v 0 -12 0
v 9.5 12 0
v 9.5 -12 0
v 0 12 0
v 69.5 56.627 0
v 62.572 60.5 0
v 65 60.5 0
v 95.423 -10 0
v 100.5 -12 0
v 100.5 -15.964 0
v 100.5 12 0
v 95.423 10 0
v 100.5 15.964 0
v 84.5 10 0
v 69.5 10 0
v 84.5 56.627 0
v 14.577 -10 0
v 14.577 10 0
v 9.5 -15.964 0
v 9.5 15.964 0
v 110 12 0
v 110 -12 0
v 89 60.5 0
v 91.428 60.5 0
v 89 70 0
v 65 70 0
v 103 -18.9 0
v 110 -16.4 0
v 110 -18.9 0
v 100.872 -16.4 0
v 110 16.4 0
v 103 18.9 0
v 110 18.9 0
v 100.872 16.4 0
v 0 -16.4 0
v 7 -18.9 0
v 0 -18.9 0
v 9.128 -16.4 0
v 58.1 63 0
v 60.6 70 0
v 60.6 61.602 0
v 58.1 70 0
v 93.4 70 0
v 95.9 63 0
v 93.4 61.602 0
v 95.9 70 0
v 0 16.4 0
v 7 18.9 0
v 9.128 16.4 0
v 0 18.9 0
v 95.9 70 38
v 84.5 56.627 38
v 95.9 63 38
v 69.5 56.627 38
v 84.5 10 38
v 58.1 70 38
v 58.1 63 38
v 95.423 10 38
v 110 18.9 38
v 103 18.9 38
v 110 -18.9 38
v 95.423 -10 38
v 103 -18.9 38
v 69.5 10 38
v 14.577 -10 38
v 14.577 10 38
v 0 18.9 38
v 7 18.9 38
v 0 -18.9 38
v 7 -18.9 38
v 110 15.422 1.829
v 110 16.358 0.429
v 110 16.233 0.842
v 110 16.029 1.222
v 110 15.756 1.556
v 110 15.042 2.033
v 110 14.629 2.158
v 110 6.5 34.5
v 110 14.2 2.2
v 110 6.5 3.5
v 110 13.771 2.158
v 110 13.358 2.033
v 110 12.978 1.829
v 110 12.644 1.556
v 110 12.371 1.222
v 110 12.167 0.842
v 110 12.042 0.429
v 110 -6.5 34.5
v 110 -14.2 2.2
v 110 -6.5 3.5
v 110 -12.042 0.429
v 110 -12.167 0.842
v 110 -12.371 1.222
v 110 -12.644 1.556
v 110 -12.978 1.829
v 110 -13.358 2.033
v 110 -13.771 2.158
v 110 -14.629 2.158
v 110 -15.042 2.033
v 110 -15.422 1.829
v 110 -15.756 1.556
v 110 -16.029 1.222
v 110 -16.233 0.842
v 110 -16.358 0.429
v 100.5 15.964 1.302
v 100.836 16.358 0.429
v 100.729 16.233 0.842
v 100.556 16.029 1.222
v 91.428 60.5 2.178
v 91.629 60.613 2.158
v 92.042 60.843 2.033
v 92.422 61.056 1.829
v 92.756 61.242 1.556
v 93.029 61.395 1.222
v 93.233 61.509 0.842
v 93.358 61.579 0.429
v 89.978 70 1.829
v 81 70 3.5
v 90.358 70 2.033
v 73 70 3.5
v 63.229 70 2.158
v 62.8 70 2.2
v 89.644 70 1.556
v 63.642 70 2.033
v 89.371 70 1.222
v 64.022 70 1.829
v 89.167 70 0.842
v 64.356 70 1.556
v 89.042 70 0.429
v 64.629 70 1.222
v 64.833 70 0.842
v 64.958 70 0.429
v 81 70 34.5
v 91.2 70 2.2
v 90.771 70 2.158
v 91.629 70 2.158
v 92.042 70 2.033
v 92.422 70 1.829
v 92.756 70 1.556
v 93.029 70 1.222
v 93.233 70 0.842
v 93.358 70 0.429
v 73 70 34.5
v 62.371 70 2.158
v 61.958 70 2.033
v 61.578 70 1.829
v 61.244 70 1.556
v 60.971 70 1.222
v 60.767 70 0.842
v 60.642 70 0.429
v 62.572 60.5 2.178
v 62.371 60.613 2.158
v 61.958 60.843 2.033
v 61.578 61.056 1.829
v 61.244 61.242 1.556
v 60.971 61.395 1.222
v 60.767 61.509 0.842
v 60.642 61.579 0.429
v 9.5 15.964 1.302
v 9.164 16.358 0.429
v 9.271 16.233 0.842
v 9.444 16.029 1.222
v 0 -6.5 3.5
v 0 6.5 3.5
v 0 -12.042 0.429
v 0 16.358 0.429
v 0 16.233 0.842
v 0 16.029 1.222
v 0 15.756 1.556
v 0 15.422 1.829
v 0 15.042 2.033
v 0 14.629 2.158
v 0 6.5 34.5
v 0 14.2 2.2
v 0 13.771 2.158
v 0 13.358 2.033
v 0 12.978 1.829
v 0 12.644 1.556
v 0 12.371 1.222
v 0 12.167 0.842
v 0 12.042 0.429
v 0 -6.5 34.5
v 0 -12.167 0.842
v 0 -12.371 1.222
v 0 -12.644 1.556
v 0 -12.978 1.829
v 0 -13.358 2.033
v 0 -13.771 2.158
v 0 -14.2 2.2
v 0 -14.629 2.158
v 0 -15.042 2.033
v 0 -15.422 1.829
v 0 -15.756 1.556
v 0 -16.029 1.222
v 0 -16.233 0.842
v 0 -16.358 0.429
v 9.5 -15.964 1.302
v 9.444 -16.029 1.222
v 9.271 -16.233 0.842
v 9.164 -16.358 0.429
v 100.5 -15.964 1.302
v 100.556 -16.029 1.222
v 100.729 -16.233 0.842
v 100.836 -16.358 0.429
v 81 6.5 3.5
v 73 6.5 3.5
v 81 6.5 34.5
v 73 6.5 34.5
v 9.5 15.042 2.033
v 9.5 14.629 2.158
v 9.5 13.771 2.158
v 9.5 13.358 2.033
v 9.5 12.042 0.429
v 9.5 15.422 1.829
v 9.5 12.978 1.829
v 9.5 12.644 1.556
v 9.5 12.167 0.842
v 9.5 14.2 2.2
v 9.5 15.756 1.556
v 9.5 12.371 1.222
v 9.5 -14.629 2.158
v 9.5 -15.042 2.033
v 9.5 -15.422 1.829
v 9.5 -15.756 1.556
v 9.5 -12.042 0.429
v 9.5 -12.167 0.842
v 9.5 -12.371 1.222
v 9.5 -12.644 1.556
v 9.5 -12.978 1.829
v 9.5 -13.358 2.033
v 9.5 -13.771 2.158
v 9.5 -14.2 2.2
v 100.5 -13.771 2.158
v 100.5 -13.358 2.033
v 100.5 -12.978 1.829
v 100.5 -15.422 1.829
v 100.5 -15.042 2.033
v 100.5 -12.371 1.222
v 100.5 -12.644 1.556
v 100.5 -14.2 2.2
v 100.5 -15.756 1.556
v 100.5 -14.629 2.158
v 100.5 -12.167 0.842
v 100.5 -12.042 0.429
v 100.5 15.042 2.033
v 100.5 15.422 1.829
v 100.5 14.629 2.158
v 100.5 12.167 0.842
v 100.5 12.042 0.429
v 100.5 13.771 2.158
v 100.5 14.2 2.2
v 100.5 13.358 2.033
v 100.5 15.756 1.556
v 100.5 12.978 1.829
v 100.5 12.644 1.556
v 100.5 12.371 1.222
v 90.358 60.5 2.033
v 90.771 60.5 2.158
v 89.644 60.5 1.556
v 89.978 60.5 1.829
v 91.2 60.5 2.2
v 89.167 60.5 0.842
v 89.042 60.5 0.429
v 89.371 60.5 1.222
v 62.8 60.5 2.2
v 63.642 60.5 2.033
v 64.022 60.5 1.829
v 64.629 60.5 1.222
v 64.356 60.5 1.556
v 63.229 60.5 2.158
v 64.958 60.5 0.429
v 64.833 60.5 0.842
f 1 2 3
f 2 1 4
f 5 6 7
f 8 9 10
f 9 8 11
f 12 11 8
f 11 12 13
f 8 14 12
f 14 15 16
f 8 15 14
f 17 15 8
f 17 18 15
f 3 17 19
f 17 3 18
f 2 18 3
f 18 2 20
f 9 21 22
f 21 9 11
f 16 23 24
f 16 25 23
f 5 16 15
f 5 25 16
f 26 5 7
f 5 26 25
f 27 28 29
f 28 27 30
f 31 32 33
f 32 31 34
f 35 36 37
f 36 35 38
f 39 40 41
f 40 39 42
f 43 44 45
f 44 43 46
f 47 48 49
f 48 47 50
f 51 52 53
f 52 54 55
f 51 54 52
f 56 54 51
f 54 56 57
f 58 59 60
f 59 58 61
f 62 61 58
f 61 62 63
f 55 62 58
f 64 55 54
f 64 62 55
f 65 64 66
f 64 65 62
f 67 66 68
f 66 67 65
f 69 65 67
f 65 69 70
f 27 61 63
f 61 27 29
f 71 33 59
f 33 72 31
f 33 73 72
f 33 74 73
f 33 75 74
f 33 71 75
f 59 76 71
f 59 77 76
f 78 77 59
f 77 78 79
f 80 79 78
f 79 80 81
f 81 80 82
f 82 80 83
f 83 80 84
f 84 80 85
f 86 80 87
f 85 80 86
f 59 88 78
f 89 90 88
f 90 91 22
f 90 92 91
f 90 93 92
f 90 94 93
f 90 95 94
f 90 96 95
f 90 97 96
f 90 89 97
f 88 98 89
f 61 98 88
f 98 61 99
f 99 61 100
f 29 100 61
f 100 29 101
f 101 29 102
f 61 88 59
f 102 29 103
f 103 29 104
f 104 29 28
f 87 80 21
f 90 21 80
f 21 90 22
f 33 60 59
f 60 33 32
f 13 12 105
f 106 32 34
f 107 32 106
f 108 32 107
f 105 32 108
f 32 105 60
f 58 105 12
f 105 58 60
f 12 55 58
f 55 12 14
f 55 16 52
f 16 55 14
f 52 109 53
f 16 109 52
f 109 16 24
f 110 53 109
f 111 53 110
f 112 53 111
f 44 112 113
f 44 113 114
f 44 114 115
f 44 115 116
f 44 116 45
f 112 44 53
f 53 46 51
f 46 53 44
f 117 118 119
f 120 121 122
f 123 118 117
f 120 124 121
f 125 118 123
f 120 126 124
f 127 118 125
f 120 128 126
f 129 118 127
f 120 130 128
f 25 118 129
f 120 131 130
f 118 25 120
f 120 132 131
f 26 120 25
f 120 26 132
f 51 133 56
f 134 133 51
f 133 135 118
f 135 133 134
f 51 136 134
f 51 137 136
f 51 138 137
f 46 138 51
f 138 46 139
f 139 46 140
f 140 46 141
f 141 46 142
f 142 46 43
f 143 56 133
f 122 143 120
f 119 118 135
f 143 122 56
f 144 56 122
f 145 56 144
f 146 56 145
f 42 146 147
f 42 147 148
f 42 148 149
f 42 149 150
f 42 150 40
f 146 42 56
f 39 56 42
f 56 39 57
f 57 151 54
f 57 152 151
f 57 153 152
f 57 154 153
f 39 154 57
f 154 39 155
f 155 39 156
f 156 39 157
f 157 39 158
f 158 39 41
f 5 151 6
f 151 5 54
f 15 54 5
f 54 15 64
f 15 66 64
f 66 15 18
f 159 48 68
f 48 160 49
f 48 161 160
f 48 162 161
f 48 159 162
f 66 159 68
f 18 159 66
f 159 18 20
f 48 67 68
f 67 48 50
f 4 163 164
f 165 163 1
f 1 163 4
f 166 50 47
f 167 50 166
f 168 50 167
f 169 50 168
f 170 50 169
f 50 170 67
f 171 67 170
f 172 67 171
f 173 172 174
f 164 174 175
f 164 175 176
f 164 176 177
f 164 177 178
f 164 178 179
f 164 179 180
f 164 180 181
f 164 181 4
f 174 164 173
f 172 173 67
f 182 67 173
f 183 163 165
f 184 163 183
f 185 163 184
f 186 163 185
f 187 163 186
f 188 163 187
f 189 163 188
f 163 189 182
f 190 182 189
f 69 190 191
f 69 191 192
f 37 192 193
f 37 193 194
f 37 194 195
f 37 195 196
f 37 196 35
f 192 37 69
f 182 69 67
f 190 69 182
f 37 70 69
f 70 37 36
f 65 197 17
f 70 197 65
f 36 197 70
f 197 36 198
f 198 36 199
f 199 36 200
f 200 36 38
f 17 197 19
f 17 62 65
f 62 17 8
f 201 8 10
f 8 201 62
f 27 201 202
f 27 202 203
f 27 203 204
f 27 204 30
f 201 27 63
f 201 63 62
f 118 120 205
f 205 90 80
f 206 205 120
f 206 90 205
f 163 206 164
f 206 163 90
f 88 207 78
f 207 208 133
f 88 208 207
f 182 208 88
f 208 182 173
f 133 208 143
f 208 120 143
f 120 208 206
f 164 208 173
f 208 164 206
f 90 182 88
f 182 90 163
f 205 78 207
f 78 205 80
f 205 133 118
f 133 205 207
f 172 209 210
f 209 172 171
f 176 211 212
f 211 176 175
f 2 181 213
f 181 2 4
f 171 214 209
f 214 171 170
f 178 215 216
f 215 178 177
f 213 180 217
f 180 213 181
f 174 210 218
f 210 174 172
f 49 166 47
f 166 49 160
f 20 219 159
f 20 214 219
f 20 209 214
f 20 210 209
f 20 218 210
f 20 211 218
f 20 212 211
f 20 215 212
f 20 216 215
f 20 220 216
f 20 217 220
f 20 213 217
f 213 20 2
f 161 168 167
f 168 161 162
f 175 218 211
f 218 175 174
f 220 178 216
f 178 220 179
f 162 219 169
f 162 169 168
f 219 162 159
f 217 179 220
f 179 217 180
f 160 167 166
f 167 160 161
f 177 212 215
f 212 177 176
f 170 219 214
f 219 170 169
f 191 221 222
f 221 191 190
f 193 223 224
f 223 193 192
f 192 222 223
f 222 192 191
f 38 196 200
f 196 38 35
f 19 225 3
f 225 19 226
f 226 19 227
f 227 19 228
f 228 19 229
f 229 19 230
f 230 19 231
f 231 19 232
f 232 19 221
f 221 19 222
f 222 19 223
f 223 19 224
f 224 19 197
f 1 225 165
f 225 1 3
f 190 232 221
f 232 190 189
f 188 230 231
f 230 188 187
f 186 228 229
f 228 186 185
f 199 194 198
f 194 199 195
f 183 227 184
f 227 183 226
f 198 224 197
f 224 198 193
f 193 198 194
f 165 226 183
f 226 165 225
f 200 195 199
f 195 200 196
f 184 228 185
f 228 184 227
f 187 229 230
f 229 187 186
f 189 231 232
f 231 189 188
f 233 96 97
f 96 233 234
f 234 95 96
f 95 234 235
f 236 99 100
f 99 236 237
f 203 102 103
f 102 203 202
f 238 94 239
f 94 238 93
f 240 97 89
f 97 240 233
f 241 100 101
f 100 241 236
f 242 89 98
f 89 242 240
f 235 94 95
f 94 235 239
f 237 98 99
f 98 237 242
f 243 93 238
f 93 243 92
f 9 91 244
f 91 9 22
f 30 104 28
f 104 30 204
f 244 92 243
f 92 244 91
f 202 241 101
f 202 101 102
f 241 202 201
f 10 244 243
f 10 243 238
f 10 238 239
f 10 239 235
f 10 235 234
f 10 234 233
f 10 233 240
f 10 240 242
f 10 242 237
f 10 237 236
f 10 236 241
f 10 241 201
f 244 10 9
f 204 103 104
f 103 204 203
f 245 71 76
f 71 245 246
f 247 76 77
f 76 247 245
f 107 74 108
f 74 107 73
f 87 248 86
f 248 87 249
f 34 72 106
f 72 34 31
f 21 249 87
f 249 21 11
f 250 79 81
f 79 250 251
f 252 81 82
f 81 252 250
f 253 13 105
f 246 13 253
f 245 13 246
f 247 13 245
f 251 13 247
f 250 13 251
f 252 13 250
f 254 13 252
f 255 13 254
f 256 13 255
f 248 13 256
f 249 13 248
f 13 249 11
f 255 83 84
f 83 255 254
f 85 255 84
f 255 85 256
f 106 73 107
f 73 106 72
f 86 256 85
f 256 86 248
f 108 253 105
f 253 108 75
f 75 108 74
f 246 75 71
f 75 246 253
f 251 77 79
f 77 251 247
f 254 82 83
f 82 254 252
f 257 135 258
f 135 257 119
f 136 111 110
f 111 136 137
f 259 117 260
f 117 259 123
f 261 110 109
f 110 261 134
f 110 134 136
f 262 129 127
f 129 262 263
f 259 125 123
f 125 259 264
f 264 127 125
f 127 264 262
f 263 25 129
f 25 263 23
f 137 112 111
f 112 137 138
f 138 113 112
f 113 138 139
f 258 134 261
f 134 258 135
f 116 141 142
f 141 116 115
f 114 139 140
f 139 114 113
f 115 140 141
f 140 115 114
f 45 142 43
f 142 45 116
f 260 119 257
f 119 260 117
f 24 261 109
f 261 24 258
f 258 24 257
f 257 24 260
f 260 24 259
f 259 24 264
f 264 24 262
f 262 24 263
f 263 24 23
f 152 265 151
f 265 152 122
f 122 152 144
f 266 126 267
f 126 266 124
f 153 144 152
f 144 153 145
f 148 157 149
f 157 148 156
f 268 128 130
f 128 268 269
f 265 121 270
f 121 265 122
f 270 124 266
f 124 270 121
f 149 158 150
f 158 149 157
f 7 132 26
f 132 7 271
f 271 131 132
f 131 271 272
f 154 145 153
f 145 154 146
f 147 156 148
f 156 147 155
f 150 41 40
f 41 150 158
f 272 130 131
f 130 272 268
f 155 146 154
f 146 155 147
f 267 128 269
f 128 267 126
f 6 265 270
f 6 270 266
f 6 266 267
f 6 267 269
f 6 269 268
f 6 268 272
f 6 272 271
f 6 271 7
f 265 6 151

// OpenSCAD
$fn = 32;

// ----------------------------------------------------------------------
// Air duct: 20 mm duct, 3.5 mm wall, 38 mm across
// ----------------------------------------------------------------------

// --- parameters (mm) ---
duct_r = 10;              // duct core radius
duct_d = 20;              // duct core diameter
wall = 3.5;               // duct wall thickness
height = 38;              // duct width (extrusion height)
port_r = 18.9;            // port flange half width
port_d = 37.8;            // port flange width
port_t = 7;               // port flange thickness
bolt_d = 4.4;             // port bolt holes
bolt_offset = 14.2;       // bolt hole offset from the port axis
branch_r = 7.5;           // branch core radius
branch_d = 15;            // branch core diameter
branch_len = 70;          // branch length from the run axis

difference() {
  /* outer hull chain: tube with a flat flange plate at every port */
  linear_extrude(height = 38) {
    hull() {
      polygon([[0, -18.9], [0, 18.9], [7, 18.9], [7, -18.9]]);
      translate([10, 0]) circle(r = 10);
    }
    hull() {
      translate([10, 0]) circle(r = 10);
      translate([33, 0]) circle(r = 10);
    }
    hull() {
      translate([33, 0]) circle(r = 10);
      translate([77, 0]) circle(r = 10);
    }
    hull() {
      translate([77, 0]) circle(r = 10);
      translate([100, 0]) circle(r = 10);
    }
    hull() {
      translate([100, 0]) circle(r = 10);
      polygon([[110, 18.9], [110, -18.9], [103, -18.9], [103, 18.9]]);
    }
    hull() {
      translate([77, 0]) circle(r = 7.5);
      translate([77, 38.5]) circle(r = 7.5);
    }
    hull() {
      translate([77, 38.5]) circle(r = 7.5);
      translate([77, 61]) circle(r = 7.5);
    }
    hull() {
      translate([77, 61]) circle(r = 7.5);
      polygon([[58.1, 70], [95.9, 70], [95.9, 63], [58.1, 63]]);
    }
  }
  /* air passage: the same chain inset by the wall, 5 mm proud of the ports */
  translate([0, 0, 3.5]) linear_extrude(height = 31) {
    hull() {
      translate([-5, 0]) circle(r = 6.5);
      translate([33, 0]) circle(r = 6.5);
    }
    hull() {
      translate([33, 0]) circle(r = 6.5);
      translate([77, 0]) circle(r = 6.5);
    }
    hull() {
      translate([77, 0]) circle(r = 6.5);
      translate([115, 0]) circle(r = 6.5);
    }
    hull() {
      translate([77, 0]) circle(r = 4);
      translate([77, 38.5]) circle(r = 4);
    }
    hull() {
      translate([77, 38.5]) circle(r = 4);
      translate([77, 75]) circle(r = 4);
    }
  }
  translate([0, 0]) rotate([0, 0, -90]) translate([-14.2, -2.5]) rotate([-90, 0, 0]) cylinder(h = 12, d = 4.4);
  translate([0, 0]) rotate([0, 0, -90]) translate([14.2, -2.5]) rotate([-90, 0, 0]) cylinder(h = 12, d = 4.4);
  translate([110, 0]) rotate([0, 0, 90]) translate([-14.2, -2.5]) rotate([-90, 0, 0]) cylinder(h = 12, d = 4.4);
  translate([110, 0]) rotate([0, 0, 90]) translate([14.2, -2.5]) rotate([-90, 0, 0]) cylinder(h = 12, d = 4.4);
  translate([77, 70]) rotate([0, 0, 180]) translate([-14.2, -2.5]) rotate([-90, 0, 0]) cylinder(h = 12, d = 4.4);
  translate([77, 70]) rotate([0, 0, 180]) translate([14.2, -2.5]) rotate([-90, 0, 0]) cylinder(h = 12, d = 4.4);
}
